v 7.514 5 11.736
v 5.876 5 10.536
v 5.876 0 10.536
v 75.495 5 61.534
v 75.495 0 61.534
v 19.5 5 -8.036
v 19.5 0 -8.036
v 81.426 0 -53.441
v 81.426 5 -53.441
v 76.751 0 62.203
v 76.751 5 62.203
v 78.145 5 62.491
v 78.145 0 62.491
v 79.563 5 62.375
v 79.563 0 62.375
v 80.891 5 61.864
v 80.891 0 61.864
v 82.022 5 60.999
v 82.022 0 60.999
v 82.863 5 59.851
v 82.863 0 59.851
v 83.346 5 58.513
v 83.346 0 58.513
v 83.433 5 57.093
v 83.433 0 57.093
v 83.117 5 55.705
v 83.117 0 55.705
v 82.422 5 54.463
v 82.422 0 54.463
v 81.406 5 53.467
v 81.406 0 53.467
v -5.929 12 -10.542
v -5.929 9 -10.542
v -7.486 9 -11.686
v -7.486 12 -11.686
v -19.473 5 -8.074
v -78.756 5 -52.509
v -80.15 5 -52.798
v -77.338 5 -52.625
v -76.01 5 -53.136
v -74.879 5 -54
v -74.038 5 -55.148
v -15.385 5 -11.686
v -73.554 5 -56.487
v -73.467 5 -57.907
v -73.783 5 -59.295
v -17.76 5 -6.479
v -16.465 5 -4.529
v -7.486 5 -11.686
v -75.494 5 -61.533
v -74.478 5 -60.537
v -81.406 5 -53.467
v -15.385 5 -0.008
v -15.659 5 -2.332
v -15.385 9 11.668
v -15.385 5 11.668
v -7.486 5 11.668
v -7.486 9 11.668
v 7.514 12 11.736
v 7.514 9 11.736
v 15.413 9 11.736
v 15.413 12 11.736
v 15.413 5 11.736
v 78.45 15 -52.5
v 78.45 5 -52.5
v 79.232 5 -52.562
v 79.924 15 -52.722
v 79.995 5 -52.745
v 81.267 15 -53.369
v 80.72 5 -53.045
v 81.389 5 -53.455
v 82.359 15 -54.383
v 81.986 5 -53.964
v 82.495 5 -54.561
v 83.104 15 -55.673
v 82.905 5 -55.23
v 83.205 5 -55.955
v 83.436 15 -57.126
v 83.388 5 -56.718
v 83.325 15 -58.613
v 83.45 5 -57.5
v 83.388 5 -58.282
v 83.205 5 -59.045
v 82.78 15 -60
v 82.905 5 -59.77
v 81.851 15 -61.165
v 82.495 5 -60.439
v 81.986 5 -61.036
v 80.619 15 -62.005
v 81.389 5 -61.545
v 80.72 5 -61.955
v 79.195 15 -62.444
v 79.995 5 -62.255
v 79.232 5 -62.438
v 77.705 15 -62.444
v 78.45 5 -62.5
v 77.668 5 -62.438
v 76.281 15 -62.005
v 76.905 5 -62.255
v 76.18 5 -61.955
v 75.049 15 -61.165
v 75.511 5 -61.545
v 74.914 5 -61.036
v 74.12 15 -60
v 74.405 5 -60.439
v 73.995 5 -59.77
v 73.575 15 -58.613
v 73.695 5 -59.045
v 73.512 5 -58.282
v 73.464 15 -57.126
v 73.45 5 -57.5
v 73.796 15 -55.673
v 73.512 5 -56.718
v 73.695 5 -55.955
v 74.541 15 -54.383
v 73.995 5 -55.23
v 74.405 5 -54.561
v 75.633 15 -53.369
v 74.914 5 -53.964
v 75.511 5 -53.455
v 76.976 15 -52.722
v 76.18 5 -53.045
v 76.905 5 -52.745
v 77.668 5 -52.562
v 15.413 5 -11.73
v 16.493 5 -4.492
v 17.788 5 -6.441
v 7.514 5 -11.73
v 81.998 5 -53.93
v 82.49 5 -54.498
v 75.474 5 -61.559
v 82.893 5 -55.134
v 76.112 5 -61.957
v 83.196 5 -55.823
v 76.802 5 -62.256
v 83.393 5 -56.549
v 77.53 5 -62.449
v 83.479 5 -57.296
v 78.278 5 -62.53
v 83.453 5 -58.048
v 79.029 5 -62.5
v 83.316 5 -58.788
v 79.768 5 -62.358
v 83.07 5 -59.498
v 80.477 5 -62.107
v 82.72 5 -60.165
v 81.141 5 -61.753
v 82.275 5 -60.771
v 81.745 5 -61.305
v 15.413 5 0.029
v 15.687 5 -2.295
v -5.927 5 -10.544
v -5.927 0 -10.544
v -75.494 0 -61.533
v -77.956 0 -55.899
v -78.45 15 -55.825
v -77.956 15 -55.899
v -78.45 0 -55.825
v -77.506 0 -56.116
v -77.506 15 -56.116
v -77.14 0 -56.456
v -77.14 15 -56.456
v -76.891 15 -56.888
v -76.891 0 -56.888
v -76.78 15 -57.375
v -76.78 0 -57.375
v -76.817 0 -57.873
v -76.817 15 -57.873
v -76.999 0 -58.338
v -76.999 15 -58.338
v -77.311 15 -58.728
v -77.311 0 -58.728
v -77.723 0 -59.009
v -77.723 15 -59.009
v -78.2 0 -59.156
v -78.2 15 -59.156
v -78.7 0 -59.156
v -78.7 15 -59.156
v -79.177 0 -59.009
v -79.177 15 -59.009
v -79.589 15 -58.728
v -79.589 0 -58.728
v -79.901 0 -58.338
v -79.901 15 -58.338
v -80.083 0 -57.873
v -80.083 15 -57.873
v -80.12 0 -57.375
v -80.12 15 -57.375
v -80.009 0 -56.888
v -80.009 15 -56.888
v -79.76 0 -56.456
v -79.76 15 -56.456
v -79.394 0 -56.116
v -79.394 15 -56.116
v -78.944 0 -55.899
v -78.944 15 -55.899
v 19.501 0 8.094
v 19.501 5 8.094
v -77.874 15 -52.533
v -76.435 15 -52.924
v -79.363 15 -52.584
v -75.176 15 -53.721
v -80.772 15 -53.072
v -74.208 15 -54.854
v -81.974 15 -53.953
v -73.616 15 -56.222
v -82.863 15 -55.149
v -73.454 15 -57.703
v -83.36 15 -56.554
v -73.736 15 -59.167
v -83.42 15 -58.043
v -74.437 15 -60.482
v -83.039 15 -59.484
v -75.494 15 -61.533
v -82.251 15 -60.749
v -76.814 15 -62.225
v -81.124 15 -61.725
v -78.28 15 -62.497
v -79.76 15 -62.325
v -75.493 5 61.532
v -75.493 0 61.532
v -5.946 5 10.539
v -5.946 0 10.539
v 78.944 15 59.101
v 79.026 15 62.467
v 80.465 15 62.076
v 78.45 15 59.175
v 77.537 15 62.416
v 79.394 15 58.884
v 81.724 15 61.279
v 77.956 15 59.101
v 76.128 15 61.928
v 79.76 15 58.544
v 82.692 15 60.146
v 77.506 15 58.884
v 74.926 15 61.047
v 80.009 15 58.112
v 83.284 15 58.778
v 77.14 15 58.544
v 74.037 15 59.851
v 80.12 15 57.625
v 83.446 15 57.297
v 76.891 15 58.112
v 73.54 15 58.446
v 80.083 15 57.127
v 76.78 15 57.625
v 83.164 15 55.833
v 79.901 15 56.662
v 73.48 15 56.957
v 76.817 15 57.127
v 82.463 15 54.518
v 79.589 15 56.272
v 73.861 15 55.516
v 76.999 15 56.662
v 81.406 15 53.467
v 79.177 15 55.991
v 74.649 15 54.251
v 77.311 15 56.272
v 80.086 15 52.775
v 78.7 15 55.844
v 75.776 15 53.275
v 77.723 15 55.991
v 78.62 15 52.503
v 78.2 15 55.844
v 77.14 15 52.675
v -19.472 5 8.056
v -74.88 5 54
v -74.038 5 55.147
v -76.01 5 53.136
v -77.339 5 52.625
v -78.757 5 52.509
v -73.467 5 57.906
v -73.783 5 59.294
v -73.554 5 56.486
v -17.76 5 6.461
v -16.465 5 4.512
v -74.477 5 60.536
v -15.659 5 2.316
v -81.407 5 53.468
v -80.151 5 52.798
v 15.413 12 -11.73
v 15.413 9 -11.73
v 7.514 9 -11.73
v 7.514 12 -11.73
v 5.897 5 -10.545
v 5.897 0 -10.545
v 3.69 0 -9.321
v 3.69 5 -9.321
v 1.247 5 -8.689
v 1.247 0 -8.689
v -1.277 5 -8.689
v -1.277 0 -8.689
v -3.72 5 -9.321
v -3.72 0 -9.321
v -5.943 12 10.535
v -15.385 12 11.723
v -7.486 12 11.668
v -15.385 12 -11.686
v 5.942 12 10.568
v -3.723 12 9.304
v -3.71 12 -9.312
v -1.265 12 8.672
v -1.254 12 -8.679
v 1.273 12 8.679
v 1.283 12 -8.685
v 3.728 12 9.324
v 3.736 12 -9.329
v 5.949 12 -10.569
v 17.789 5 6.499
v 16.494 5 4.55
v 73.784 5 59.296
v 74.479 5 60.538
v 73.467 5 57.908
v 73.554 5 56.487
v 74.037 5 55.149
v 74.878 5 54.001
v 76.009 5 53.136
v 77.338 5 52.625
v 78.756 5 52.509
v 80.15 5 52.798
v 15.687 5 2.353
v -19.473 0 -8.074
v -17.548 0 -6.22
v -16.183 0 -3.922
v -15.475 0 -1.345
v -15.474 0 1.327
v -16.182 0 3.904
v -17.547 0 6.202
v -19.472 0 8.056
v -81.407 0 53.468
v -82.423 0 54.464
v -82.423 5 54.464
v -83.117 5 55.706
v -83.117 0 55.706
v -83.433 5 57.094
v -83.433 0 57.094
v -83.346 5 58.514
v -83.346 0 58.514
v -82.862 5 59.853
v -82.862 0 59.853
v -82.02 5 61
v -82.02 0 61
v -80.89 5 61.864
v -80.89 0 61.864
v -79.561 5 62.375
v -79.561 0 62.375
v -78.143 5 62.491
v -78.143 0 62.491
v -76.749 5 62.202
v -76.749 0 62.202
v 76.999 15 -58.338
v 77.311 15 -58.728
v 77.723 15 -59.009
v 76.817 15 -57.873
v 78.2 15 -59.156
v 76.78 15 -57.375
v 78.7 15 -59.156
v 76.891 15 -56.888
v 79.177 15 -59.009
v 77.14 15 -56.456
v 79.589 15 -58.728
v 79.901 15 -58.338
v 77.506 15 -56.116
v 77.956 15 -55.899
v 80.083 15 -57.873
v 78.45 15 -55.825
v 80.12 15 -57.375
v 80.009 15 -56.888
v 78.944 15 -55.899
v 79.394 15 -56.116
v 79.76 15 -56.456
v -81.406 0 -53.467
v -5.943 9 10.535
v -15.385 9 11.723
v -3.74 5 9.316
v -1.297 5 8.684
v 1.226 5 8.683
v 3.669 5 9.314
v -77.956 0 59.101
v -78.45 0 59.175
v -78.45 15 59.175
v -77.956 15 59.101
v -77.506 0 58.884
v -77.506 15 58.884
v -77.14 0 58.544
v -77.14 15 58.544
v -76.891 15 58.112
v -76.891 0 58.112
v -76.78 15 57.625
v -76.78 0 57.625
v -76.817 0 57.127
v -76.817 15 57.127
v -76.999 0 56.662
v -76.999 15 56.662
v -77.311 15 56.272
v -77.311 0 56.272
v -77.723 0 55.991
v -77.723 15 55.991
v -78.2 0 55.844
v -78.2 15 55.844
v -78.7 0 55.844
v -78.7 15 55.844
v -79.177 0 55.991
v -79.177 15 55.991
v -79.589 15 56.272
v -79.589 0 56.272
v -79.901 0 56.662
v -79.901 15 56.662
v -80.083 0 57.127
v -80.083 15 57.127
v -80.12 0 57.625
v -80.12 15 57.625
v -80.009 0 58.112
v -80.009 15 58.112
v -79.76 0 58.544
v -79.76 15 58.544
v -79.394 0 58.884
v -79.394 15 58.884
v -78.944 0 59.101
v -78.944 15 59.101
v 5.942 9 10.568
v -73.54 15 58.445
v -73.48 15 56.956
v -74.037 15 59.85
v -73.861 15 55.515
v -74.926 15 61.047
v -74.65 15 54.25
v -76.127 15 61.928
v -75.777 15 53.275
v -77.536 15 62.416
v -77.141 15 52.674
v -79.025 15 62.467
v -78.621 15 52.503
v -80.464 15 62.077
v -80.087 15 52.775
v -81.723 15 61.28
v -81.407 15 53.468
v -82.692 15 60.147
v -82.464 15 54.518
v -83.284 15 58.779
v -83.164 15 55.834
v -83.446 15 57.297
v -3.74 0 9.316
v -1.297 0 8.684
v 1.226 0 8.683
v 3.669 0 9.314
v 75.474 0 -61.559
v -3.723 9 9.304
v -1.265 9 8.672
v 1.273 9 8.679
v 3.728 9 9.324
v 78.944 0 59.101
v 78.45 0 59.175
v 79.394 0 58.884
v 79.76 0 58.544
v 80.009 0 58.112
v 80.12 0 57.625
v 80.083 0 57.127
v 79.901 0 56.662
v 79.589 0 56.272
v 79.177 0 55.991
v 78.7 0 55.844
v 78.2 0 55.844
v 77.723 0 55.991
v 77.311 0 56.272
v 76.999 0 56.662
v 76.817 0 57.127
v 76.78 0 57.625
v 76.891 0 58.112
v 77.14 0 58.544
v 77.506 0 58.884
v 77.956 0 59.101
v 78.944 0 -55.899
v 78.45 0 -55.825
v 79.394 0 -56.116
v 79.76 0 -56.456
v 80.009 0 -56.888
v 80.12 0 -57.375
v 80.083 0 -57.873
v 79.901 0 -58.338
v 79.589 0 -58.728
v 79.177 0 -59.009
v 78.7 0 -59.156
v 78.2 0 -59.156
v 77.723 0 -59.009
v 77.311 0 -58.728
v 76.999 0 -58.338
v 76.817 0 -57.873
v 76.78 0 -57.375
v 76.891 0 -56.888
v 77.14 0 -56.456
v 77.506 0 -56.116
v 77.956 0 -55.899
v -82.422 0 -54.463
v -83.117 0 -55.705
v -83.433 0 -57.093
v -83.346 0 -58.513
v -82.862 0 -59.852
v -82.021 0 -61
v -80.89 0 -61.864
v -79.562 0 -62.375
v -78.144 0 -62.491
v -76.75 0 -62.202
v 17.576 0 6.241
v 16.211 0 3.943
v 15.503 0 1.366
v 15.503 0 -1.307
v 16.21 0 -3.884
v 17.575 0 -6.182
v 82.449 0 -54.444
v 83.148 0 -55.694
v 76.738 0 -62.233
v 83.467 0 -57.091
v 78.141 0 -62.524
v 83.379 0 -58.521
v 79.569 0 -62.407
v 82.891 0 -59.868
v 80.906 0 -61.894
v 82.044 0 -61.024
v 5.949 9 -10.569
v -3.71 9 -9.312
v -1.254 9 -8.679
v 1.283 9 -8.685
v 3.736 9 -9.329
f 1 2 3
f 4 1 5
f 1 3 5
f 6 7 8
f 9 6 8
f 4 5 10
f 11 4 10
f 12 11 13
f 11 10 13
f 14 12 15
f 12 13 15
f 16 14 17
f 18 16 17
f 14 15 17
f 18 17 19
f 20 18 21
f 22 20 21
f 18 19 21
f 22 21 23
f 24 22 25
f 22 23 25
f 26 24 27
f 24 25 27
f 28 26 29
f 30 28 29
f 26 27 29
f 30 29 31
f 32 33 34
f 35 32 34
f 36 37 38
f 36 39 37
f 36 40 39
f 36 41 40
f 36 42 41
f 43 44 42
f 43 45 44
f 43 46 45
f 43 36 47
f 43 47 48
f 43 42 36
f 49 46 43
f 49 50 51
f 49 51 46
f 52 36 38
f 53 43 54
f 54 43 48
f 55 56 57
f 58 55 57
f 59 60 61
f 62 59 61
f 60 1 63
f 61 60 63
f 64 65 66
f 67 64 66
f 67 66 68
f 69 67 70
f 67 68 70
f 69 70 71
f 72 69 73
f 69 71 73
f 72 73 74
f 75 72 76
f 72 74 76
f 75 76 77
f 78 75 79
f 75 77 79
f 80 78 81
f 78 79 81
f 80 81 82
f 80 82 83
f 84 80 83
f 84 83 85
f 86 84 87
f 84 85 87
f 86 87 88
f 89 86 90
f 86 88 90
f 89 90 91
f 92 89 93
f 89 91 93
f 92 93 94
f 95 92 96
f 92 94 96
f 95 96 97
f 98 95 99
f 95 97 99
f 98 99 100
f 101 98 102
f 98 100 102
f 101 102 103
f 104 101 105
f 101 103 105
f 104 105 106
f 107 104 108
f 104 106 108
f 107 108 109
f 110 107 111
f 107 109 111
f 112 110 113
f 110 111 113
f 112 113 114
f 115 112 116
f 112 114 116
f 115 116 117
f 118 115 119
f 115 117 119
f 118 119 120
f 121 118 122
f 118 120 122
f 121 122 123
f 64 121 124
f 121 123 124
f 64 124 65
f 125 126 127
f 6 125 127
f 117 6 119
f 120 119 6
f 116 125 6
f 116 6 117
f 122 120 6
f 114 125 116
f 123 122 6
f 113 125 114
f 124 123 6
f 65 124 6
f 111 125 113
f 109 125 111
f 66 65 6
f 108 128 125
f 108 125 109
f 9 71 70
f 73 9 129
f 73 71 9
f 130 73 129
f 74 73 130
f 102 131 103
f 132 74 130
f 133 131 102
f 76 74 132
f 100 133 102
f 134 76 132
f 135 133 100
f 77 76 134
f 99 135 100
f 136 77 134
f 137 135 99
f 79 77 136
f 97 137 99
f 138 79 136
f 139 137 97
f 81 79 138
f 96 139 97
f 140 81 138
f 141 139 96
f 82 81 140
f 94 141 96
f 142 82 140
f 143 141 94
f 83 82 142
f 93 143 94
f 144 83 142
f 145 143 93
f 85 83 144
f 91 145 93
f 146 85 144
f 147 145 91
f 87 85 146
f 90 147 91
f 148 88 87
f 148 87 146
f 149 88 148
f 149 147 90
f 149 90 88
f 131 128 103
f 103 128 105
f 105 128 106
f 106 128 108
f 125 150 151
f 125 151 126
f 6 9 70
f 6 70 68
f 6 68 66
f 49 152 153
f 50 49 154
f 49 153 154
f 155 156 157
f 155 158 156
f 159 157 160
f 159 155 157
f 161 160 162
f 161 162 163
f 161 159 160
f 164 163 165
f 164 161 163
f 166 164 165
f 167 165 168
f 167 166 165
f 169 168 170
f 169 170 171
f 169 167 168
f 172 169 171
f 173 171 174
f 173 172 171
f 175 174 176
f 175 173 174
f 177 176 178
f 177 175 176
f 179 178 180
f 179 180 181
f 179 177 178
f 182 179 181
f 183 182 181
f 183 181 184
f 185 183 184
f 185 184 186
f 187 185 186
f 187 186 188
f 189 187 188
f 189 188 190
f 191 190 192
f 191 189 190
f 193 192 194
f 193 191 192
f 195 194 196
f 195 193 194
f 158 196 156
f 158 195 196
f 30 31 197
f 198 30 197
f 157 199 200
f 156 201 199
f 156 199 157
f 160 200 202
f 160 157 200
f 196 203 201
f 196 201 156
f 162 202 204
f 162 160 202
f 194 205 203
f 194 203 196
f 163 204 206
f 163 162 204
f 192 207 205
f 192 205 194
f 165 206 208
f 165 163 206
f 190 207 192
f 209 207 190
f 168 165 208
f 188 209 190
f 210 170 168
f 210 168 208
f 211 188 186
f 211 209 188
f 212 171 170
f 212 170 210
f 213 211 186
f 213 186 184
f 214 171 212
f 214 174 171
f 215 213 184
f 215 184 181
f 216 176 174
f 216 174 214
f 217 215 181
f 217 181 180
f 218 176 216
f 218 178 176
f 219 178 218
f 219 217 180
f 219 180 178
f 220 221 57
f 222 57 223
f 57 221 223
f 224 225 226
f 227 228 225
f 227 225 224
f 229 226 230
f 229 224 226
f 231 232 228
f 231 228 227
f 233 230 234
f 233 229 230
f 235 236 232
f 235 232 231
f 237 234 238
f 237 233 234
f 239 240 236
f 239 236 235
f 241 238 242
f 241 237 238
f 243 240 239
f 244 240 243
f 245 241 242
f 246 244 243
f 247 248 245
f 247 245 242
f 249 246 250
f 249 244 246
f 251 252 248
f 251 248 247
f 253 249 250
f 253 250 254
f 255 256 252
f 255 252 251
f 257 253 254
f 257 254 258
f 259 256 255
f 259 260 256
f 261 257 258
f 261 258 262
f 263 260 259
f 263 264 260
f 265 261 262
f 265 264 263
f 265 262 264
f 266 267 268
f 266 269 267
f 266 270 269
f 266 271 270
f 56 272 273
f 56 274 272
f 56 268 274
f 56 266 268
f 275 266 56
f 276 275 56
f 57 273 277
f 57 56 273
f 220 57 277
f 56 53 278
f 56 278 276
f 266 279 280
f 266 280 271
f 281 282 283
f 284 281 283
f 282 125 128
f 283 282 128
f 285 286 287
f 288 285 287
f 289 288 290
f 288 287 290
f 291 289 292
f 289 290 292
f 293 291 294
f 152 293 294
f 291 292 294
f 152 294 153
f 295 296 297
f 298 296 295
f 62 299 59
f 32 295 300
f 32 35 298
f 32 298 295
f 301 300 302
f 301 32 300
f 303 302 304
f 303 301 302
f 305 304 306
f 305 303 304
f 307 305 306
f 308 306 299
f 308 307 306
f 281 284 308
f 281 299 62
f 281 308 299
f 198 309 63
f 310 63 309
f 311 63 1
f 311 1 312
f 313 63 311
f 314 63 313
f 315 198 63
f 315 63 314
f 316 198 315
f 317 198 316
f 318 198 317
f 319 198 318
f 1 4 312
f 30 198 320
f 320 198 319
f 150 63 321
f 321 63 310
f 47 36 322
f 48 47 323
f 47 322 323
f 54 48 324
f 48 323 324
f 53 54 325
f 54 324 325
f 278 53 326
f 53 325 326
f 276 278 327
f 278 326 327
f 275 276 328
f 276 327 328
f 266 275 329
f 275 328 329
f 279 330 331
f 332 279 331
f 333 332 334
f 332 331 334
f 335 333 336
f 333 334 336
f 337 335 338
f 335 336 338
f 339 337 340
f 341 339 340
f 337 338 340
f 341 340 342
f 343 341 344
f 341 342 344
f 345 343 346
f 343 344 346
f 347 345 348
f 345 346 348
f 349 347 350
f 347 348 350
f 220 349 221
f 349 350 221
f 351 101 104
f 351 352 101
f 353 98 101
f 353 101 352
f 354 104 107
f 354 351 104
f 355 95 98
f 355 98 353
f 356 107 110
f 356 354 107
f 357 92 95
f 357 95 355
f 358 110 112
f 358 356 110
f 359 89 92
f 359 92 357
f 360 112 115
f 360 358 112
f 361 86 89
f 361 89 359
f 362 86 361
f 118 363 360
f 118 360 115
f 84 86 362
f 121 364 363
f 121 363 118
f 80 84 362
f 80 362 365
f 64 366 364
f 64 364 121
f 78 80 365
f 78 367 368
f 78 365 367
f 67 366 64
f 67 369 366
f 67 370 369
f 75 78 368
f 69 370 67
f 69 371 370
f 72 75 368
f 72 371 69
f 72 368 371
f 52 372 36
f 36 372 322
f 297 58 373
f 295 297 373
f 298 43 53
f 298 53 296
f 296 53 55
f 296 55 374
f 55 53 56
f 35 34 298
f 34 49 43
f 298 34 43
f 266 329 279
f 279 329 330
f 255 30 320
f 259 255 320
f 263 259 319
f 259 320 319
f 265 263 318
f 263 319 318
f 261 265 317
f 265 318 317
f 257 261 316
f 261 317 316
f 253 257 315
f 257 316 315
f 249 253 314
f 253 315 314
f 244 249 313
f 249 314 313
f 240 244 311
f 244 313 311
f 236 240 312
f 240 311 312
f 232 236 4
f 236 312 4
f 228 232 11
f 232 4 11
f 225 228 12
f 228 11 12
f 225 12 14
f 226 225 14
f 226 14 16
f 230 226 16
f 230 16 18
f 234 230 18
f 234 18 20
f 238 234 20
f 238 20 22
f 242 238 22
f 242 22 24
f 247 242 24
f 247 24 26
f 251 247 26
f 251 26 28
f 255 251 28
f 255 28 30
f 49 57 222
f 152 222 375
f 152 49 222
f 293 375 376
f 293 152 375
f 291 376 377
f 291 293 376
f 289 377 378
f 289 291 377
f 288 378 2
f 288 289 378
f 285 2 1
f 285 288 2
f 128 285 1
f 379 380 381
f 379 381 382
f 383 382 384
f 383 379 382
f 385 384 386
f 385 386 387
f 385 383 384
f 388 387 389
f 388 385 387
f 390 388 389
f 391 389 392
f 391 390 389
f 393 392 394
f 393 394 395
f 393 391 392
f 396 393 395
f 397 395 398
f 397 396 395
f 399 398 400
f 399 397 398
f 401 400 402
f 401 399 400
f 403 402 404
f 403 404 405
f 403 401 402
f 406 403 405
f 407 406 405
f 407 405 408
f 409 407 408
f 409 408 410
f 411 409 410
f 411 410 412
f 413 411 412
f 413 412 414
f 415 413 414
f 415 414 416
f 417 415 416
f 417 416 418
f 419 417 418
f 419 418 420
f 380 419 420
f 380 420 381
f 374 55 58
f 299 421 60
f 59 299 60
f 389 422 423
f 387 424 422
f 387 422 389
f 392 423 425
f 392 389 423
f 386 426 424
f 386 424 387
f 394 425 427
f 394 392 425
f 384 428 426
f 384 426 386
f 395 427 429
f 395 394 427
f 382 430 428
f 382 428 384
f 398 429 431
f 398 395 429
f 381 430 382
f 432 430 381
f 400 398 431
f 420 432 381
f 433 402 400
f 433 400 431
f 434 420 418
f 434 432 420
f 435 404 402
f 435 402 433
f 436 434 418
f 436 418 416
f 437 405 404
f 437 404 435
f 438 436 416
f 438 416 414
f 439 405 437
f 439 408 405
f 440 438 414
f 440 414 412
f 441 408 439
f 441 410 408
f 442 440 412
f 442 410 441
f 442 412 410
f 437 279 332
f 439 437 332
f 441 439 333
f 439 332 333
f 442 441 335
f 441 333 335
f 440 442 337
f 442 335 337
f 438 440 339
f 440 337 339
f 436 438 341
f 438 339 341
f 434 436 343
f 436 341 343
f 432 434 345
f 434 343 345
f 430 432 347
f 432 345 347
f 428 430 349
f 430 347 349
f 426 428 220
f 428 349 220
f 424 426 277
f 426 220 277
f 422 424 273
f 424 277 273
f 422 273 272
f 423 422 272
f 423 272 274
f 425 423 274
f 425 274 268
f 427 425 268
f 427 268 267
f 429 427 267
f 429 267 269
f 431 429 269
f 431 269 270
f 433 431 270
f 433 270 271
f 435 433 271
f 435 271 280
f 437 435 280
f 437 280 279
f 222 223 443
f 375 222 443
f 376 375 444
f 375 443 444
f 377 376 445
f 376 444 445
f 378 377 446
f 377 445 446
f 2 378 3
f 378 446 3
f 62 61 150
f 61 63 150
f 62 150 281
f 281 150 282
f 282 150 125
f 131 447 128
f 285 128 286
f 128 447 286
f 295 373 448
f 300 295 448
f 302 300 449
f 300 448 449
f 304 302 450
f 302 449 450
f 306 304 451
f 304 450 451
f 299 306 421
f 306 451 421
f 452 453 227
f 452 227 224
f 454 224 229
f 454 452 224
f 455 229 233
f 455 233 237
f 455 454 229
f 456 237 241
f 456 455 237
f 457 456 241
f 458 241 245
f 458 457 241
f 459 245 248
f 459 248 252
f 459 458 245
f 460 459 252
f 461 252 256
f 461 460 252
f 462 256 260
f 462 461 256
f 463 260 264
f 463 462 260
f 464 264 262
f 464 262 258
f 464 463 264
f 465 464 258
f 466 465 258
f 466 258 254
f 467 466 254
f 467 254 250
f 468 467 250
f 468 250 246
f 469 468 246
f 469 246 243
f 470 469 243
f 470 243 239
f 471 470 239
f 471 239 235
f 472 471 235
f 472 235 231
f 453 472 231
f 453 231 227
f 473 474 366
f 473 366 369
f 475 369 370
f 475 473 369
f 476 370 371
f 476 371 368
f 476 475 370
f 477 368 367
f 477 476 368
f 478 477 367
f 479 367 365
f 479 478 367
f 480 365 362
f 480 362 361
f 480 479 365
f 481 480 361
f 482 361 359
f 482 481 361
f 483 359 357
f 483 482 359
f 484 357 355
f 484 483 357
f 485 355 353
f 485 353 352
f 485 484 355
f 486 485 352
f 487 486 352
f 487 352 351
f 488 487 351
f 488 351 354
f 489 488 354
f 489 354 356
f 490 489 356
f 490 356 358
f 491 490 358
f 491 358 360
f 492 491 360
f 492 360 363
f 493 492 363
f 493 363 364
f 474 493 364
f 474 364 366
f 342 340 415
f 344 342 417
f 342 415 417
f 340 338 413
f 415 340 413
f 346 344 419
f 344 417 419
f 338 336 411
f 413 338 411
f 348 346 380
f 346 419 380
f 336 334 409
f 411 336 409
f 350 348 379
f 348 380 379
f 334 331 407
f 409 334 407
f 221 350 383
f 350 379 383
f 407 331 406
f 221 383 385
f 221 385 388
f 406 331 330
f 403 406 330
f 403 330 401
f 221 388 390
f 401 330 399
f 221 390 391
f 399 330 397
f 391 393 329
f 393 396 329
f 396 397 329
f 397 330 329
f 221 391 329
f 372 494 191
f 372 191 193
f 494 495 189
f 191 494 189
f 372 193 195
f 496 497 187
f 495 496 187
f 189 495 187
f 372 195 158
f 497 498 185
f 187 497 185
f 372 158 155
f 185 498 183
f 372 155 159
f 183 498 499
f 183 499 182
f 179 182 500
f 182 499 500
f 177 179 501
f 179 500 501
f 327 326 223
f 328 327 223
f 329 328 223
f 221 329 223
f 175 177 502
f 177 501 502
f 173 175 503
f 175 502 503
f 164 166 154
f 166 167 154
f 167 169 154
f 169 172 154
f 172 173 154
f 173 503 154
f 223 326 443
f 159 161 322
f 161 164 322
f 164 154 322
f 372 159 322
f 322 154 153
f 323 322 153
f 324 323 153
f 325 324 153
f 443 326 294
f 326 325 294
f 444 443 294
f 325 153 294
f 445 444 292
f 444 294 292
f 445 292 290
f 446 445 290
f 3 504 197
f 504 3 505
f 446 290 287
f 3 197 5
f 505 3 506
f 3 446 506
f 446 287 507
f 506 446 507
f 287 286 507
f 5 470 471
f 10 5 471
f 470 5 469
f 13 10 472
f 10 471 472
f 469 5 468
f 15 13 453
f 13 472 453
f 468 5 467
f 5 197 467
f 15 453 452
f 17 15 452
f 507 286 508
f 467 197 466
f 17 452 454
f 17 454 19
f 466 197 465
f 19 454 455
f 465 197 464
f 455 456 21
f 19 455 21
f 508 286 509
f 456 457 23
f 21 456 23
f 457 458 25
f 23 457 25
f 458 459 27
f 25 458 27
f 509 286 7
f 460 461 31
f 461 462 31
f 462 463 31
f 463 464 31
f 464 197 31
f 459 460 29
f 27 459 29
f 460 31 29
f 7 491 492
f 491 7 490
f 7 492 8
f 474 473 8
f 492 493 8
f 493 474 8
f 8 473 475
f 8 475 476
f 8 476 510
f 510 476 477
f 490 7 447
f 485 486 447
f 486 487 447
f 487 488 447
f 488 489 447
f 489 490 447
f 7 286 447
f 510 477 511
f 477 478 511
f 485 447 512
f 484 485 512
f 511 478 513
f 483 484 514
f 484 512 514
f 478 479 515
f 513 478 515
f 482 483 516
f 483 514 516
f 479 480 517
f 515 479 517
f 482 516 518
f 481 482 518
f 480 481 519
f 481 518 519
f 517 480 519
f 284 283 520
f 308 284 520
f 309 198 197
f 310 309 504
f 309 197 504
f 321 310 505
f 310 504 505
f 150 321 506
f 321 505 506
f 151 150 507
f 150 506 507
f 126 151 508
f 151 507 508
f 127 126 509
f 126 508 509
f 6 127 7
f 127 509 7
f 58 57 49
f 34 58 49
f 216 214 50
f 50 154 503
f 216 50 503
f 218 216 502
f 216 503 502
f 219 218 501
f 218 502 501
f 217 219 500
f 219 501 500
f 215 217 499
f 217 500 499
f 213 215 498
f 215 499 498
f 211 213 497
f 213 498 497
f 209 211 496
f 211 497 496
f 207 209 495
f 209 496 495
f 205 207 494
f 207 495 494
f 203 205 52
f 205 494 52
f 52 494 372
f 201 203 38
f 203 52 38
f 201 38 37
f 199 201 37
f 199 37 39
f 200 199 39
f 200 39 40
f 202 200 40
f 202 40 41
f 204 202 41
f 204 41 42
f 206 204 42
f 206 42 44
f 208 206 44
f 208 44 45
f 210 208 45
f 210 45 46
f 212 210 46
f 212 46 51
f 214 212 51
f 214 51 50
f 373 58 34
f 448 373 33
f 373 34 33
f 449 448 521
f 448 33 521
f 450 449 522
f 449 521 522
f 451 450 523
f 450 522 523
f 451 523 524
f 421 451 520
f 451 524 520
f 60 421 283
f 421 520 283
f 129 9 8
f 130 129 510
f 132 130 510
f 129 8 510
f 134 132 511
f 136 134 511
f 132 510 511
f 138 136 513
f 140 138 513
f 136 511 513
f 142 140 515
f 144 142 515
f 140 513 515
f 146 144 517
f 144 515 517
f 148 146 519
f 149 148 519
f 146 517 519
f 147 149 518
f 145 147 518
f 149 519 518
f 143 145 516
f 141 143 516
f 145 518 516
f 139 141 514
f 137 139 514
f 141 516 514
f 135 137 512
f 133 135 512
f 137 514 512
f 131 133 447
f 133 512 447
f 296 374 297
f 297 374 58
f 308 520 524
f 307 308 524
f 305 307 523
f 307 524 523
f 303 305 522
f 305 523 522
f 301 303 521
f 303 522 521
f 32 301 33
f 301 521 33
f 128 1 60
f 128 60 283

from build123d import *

# Parameters (mm, degrees)
SKETCH2_R           = 1.675
BOSS_EXTRUDE2_DEPTH = 5
SKETCH4_R           = 5
SKETCH4_R_2         = 1.675
BOSS_EXTRUDE3_DEPTH = 10
SKETCH7_W           = 7.89896268
SKETCH7_H           = 23.466499487
BOSS_EXTRUDE4_DEPTH = 4
BOSS_EXTRUDE5_DEPTH = 3


with BuildPart() as part:
    # Sketch2 → Boss-Extrude2 (new body)
    with BuildSketch(Plane(origin=(0, 0, 0), x_dir=(1, 0, 0), z_dir=(0, 1, 0))):
        with BuildLine():
            Line((-5.927337077, 10.543675079), (-75.494184373, 61.532760094))
            ThreePointArc((-75.494184373, 61.532760094), (-82.4827602, 60.455815483), (-81.405815339, 53.467239694))
            Line((-81.405815339, 53.467239694), (-19.473220794, 8.073687288))
            ThreePointArc((-19.473220794, 8.073687288), (-15.384851579, 0.009024421), (-19.471837334, -8.056339641))
            Line((-19.471837334, -8.056339641), (-81.406507067, -53.467746788))
            ThreePointArc((-81.406507067, -53.467746788), (-82.482253212, -60.456507067), (-75.493492933, -61.532253212))
            Line((-75.493492933, -61.532253212), (-5.946235564, -10.53918529))
            ThreePointArc((-5.946235564, -10.53918529), (-0.035497695, -8.603691918), (5.87612073, -10.53649412))
            Line((5.87612073, -10.53649412), (75.495328977, -61.533598783))
            ThreePointArc((75.495328977, -61.533598783), (82.483179585, -60.455243211), (81.405815339, -53.467239694))
            Line((81.405815339, -53.467239694), (19.501443033, -8.094372803))
            ThreePointArc((19.501443033, -8.094372803), (15.413073818, -0.029709936), (19.500059572, 8.035654125))
            Line((19.500059572, 8.035654125), (81.426238752, 53.440835874))
            ThreePointArc((81.426238752, 53.440835874), (82.509164133, 60.476238742), (75.473761267, 61.55916414))
            Line((75.473761267, 61.55916414), (5.897307879, 10.54468927))
            ThreePointArc((5.897307879, 10.54468927), (-0.014848637, 8.609195675), (-5.927337077, 10.543675079))
        make_face()
        with Locations(Location((-78.45, 57.5, 0), (0, 0, 270))):
            Circle(SKETCH2_R, mode=Mode.SUBTRACT)
        with Locations(Location((-78.45, -57.5, 0), (0, 0, 270))):
            Circle(SKETCH2_R, mode=Mode.SUBTRACT)
        with Locations(Location((78.45, 57.5, 0), (0, 0, 270))):
            Circle(SKETCH2_R, mode=Mode.SUBTRACT)
        with Locations(Location((78.45, -57.5, 0), (0, 0, 270))):
            Circle(SKETCH2_R, mode=Mode.SUBTRACT)
    extrude(amount=BOSS_EXTRUDE2_DEPTH)

    # Sketch4 → Boss-Extrude3 (add)
    # profile 1 of 4: a face of its own
    with BuildSketch(Plane(origin=(0, 5, 0), x_dir=(1, 0, 0), z_dir=(0, 1, 0))):
        with Locations(Location((-78.45, 57.5, 0), (0, 0, 53.760412974))):
            Circle(SKETCH4_R)
        with Locations(Location((-78.45, 57.5, 0), (0, 0, 270))):
            Circle(SKETCH4_R_2, mode=Mode.SUBTRACT)
    # profile 2 of 4: a face of its own
    with BuildSketch(Plane(origin=(0, 5, 0), x_dir=(1, 0, 0), z_dir=(0, 1, 0))):
        with Locations(Location((78.45, 57.5, 0), (0, 0, 270))):
            Circle(SKETCH4_R)
        with Locations(Location((78.45, 57.5, 0), (0, 0, 270))):
            Circle(SKETCH4_R_2, mode=Mode.SUBTRACT)
    # profile 3 of 4: a face of its own
    with BuildSketch(Plane(origin=(0, 5, 0), x_dir=(1, 0, 0), z_dir=(0, 1, 0))):
        with Locations(Location((-78.45, -57.5, 0), (0, 0, 126.24941546))):
            Circle(SKETCH4_R)
        with Locations(Location((-78.45, -57.5, 0), (0, 0, 270))):
            Circle(SKETCH4_R_2, mode=Mode.SUBTRACT)
    # profile 4 of 4: a face of its own
    with BuildSketch(Plane(origin=(0, 5, 0), x_dir=(1, 0, 0), z_dir=(0, 1, 0))):
        with Locations(Location((78.45, -57.5, 0), (0, 0, 53.760412974))):
            Circle(SKETCH4_R)
        with Locations(Location((78.45, -57.5, 0), (0, 0, 270))):
            Circle(SKETCH4_R_2, mode=Mode.SUBTRACT)
    extrude(amount=BOSS_EXTRUDE3_DEPTH)

    # Sketch7 → Boss-Extrude4 (add)
    with BuildSketch(Plane(origin=(0, 5, 0), x_dir=(1, 0, 0), z_dir=(0, 1, 0))):
        Polygon((-15.384851579, 0.009024421), (-15.384851579, -11.66808167), (-7.485888899, -11.66808167), (-7.485888899, -0.137260517), (-7.485888899, 11.686017077), (-15.384851579, 11.686017077), align=None)
        with Locations((11.463592441, -0.003096667)):
            Rectangle(SKETCH7_W, SKETCH7_H)
    extrude(amount=BOSS_EXTRUDE4_DEPTH)

    # Sketch8 → Boss-Extrude5 (add)
    with BuildSketch(Plane(origin=(0, 9, 0), x_dir=(1, 0, 0), z_dir=(0, 1, 0))):
        with BuildLine():
            Line((-15.384851579, -11.722899791), (-7.485888899, -11.66808167))
            Line((-7.485888899, -11.66808167), (-5.943452184, -10.53498393))
            ThreePointArc((-5.943452184, -10.53498393), (0.004475009, -8.594141897), (5.941608561, -10.567755551))
            Line((5.941608561, -10.567755551), (7.514111101, -11.73634641))
            Line((7.514111101, -11.73634641), (15.413073781, -11.73634641))
            Line((15.413073781, -11.73634641), (15.413073781, 11.730153077))
            Line((15.413073781, 11.730153077), (7.514111101, 11.730153077))
            Line((7.514111101, 11.730153077), (5.94895034, 10.569274798))
            ThreePointArc((5.94895034, 10.569274798), (0.014632257, 8.601189918), (-5.928647633, 10.542043685))
            Line((-5.928647633, 10.542043685), (-7.485888899, 11.686017077))
            Line((-7.485888899, 11.686017077), (-15.384851579, 11.686017077))
            Line((-15.384851579, 11.686017077), (-15.384851579, -11.722899791))
        make_face()
    extrude(amount=BOSS_EXTRUDE5_DEPTH)


solid = part.part
